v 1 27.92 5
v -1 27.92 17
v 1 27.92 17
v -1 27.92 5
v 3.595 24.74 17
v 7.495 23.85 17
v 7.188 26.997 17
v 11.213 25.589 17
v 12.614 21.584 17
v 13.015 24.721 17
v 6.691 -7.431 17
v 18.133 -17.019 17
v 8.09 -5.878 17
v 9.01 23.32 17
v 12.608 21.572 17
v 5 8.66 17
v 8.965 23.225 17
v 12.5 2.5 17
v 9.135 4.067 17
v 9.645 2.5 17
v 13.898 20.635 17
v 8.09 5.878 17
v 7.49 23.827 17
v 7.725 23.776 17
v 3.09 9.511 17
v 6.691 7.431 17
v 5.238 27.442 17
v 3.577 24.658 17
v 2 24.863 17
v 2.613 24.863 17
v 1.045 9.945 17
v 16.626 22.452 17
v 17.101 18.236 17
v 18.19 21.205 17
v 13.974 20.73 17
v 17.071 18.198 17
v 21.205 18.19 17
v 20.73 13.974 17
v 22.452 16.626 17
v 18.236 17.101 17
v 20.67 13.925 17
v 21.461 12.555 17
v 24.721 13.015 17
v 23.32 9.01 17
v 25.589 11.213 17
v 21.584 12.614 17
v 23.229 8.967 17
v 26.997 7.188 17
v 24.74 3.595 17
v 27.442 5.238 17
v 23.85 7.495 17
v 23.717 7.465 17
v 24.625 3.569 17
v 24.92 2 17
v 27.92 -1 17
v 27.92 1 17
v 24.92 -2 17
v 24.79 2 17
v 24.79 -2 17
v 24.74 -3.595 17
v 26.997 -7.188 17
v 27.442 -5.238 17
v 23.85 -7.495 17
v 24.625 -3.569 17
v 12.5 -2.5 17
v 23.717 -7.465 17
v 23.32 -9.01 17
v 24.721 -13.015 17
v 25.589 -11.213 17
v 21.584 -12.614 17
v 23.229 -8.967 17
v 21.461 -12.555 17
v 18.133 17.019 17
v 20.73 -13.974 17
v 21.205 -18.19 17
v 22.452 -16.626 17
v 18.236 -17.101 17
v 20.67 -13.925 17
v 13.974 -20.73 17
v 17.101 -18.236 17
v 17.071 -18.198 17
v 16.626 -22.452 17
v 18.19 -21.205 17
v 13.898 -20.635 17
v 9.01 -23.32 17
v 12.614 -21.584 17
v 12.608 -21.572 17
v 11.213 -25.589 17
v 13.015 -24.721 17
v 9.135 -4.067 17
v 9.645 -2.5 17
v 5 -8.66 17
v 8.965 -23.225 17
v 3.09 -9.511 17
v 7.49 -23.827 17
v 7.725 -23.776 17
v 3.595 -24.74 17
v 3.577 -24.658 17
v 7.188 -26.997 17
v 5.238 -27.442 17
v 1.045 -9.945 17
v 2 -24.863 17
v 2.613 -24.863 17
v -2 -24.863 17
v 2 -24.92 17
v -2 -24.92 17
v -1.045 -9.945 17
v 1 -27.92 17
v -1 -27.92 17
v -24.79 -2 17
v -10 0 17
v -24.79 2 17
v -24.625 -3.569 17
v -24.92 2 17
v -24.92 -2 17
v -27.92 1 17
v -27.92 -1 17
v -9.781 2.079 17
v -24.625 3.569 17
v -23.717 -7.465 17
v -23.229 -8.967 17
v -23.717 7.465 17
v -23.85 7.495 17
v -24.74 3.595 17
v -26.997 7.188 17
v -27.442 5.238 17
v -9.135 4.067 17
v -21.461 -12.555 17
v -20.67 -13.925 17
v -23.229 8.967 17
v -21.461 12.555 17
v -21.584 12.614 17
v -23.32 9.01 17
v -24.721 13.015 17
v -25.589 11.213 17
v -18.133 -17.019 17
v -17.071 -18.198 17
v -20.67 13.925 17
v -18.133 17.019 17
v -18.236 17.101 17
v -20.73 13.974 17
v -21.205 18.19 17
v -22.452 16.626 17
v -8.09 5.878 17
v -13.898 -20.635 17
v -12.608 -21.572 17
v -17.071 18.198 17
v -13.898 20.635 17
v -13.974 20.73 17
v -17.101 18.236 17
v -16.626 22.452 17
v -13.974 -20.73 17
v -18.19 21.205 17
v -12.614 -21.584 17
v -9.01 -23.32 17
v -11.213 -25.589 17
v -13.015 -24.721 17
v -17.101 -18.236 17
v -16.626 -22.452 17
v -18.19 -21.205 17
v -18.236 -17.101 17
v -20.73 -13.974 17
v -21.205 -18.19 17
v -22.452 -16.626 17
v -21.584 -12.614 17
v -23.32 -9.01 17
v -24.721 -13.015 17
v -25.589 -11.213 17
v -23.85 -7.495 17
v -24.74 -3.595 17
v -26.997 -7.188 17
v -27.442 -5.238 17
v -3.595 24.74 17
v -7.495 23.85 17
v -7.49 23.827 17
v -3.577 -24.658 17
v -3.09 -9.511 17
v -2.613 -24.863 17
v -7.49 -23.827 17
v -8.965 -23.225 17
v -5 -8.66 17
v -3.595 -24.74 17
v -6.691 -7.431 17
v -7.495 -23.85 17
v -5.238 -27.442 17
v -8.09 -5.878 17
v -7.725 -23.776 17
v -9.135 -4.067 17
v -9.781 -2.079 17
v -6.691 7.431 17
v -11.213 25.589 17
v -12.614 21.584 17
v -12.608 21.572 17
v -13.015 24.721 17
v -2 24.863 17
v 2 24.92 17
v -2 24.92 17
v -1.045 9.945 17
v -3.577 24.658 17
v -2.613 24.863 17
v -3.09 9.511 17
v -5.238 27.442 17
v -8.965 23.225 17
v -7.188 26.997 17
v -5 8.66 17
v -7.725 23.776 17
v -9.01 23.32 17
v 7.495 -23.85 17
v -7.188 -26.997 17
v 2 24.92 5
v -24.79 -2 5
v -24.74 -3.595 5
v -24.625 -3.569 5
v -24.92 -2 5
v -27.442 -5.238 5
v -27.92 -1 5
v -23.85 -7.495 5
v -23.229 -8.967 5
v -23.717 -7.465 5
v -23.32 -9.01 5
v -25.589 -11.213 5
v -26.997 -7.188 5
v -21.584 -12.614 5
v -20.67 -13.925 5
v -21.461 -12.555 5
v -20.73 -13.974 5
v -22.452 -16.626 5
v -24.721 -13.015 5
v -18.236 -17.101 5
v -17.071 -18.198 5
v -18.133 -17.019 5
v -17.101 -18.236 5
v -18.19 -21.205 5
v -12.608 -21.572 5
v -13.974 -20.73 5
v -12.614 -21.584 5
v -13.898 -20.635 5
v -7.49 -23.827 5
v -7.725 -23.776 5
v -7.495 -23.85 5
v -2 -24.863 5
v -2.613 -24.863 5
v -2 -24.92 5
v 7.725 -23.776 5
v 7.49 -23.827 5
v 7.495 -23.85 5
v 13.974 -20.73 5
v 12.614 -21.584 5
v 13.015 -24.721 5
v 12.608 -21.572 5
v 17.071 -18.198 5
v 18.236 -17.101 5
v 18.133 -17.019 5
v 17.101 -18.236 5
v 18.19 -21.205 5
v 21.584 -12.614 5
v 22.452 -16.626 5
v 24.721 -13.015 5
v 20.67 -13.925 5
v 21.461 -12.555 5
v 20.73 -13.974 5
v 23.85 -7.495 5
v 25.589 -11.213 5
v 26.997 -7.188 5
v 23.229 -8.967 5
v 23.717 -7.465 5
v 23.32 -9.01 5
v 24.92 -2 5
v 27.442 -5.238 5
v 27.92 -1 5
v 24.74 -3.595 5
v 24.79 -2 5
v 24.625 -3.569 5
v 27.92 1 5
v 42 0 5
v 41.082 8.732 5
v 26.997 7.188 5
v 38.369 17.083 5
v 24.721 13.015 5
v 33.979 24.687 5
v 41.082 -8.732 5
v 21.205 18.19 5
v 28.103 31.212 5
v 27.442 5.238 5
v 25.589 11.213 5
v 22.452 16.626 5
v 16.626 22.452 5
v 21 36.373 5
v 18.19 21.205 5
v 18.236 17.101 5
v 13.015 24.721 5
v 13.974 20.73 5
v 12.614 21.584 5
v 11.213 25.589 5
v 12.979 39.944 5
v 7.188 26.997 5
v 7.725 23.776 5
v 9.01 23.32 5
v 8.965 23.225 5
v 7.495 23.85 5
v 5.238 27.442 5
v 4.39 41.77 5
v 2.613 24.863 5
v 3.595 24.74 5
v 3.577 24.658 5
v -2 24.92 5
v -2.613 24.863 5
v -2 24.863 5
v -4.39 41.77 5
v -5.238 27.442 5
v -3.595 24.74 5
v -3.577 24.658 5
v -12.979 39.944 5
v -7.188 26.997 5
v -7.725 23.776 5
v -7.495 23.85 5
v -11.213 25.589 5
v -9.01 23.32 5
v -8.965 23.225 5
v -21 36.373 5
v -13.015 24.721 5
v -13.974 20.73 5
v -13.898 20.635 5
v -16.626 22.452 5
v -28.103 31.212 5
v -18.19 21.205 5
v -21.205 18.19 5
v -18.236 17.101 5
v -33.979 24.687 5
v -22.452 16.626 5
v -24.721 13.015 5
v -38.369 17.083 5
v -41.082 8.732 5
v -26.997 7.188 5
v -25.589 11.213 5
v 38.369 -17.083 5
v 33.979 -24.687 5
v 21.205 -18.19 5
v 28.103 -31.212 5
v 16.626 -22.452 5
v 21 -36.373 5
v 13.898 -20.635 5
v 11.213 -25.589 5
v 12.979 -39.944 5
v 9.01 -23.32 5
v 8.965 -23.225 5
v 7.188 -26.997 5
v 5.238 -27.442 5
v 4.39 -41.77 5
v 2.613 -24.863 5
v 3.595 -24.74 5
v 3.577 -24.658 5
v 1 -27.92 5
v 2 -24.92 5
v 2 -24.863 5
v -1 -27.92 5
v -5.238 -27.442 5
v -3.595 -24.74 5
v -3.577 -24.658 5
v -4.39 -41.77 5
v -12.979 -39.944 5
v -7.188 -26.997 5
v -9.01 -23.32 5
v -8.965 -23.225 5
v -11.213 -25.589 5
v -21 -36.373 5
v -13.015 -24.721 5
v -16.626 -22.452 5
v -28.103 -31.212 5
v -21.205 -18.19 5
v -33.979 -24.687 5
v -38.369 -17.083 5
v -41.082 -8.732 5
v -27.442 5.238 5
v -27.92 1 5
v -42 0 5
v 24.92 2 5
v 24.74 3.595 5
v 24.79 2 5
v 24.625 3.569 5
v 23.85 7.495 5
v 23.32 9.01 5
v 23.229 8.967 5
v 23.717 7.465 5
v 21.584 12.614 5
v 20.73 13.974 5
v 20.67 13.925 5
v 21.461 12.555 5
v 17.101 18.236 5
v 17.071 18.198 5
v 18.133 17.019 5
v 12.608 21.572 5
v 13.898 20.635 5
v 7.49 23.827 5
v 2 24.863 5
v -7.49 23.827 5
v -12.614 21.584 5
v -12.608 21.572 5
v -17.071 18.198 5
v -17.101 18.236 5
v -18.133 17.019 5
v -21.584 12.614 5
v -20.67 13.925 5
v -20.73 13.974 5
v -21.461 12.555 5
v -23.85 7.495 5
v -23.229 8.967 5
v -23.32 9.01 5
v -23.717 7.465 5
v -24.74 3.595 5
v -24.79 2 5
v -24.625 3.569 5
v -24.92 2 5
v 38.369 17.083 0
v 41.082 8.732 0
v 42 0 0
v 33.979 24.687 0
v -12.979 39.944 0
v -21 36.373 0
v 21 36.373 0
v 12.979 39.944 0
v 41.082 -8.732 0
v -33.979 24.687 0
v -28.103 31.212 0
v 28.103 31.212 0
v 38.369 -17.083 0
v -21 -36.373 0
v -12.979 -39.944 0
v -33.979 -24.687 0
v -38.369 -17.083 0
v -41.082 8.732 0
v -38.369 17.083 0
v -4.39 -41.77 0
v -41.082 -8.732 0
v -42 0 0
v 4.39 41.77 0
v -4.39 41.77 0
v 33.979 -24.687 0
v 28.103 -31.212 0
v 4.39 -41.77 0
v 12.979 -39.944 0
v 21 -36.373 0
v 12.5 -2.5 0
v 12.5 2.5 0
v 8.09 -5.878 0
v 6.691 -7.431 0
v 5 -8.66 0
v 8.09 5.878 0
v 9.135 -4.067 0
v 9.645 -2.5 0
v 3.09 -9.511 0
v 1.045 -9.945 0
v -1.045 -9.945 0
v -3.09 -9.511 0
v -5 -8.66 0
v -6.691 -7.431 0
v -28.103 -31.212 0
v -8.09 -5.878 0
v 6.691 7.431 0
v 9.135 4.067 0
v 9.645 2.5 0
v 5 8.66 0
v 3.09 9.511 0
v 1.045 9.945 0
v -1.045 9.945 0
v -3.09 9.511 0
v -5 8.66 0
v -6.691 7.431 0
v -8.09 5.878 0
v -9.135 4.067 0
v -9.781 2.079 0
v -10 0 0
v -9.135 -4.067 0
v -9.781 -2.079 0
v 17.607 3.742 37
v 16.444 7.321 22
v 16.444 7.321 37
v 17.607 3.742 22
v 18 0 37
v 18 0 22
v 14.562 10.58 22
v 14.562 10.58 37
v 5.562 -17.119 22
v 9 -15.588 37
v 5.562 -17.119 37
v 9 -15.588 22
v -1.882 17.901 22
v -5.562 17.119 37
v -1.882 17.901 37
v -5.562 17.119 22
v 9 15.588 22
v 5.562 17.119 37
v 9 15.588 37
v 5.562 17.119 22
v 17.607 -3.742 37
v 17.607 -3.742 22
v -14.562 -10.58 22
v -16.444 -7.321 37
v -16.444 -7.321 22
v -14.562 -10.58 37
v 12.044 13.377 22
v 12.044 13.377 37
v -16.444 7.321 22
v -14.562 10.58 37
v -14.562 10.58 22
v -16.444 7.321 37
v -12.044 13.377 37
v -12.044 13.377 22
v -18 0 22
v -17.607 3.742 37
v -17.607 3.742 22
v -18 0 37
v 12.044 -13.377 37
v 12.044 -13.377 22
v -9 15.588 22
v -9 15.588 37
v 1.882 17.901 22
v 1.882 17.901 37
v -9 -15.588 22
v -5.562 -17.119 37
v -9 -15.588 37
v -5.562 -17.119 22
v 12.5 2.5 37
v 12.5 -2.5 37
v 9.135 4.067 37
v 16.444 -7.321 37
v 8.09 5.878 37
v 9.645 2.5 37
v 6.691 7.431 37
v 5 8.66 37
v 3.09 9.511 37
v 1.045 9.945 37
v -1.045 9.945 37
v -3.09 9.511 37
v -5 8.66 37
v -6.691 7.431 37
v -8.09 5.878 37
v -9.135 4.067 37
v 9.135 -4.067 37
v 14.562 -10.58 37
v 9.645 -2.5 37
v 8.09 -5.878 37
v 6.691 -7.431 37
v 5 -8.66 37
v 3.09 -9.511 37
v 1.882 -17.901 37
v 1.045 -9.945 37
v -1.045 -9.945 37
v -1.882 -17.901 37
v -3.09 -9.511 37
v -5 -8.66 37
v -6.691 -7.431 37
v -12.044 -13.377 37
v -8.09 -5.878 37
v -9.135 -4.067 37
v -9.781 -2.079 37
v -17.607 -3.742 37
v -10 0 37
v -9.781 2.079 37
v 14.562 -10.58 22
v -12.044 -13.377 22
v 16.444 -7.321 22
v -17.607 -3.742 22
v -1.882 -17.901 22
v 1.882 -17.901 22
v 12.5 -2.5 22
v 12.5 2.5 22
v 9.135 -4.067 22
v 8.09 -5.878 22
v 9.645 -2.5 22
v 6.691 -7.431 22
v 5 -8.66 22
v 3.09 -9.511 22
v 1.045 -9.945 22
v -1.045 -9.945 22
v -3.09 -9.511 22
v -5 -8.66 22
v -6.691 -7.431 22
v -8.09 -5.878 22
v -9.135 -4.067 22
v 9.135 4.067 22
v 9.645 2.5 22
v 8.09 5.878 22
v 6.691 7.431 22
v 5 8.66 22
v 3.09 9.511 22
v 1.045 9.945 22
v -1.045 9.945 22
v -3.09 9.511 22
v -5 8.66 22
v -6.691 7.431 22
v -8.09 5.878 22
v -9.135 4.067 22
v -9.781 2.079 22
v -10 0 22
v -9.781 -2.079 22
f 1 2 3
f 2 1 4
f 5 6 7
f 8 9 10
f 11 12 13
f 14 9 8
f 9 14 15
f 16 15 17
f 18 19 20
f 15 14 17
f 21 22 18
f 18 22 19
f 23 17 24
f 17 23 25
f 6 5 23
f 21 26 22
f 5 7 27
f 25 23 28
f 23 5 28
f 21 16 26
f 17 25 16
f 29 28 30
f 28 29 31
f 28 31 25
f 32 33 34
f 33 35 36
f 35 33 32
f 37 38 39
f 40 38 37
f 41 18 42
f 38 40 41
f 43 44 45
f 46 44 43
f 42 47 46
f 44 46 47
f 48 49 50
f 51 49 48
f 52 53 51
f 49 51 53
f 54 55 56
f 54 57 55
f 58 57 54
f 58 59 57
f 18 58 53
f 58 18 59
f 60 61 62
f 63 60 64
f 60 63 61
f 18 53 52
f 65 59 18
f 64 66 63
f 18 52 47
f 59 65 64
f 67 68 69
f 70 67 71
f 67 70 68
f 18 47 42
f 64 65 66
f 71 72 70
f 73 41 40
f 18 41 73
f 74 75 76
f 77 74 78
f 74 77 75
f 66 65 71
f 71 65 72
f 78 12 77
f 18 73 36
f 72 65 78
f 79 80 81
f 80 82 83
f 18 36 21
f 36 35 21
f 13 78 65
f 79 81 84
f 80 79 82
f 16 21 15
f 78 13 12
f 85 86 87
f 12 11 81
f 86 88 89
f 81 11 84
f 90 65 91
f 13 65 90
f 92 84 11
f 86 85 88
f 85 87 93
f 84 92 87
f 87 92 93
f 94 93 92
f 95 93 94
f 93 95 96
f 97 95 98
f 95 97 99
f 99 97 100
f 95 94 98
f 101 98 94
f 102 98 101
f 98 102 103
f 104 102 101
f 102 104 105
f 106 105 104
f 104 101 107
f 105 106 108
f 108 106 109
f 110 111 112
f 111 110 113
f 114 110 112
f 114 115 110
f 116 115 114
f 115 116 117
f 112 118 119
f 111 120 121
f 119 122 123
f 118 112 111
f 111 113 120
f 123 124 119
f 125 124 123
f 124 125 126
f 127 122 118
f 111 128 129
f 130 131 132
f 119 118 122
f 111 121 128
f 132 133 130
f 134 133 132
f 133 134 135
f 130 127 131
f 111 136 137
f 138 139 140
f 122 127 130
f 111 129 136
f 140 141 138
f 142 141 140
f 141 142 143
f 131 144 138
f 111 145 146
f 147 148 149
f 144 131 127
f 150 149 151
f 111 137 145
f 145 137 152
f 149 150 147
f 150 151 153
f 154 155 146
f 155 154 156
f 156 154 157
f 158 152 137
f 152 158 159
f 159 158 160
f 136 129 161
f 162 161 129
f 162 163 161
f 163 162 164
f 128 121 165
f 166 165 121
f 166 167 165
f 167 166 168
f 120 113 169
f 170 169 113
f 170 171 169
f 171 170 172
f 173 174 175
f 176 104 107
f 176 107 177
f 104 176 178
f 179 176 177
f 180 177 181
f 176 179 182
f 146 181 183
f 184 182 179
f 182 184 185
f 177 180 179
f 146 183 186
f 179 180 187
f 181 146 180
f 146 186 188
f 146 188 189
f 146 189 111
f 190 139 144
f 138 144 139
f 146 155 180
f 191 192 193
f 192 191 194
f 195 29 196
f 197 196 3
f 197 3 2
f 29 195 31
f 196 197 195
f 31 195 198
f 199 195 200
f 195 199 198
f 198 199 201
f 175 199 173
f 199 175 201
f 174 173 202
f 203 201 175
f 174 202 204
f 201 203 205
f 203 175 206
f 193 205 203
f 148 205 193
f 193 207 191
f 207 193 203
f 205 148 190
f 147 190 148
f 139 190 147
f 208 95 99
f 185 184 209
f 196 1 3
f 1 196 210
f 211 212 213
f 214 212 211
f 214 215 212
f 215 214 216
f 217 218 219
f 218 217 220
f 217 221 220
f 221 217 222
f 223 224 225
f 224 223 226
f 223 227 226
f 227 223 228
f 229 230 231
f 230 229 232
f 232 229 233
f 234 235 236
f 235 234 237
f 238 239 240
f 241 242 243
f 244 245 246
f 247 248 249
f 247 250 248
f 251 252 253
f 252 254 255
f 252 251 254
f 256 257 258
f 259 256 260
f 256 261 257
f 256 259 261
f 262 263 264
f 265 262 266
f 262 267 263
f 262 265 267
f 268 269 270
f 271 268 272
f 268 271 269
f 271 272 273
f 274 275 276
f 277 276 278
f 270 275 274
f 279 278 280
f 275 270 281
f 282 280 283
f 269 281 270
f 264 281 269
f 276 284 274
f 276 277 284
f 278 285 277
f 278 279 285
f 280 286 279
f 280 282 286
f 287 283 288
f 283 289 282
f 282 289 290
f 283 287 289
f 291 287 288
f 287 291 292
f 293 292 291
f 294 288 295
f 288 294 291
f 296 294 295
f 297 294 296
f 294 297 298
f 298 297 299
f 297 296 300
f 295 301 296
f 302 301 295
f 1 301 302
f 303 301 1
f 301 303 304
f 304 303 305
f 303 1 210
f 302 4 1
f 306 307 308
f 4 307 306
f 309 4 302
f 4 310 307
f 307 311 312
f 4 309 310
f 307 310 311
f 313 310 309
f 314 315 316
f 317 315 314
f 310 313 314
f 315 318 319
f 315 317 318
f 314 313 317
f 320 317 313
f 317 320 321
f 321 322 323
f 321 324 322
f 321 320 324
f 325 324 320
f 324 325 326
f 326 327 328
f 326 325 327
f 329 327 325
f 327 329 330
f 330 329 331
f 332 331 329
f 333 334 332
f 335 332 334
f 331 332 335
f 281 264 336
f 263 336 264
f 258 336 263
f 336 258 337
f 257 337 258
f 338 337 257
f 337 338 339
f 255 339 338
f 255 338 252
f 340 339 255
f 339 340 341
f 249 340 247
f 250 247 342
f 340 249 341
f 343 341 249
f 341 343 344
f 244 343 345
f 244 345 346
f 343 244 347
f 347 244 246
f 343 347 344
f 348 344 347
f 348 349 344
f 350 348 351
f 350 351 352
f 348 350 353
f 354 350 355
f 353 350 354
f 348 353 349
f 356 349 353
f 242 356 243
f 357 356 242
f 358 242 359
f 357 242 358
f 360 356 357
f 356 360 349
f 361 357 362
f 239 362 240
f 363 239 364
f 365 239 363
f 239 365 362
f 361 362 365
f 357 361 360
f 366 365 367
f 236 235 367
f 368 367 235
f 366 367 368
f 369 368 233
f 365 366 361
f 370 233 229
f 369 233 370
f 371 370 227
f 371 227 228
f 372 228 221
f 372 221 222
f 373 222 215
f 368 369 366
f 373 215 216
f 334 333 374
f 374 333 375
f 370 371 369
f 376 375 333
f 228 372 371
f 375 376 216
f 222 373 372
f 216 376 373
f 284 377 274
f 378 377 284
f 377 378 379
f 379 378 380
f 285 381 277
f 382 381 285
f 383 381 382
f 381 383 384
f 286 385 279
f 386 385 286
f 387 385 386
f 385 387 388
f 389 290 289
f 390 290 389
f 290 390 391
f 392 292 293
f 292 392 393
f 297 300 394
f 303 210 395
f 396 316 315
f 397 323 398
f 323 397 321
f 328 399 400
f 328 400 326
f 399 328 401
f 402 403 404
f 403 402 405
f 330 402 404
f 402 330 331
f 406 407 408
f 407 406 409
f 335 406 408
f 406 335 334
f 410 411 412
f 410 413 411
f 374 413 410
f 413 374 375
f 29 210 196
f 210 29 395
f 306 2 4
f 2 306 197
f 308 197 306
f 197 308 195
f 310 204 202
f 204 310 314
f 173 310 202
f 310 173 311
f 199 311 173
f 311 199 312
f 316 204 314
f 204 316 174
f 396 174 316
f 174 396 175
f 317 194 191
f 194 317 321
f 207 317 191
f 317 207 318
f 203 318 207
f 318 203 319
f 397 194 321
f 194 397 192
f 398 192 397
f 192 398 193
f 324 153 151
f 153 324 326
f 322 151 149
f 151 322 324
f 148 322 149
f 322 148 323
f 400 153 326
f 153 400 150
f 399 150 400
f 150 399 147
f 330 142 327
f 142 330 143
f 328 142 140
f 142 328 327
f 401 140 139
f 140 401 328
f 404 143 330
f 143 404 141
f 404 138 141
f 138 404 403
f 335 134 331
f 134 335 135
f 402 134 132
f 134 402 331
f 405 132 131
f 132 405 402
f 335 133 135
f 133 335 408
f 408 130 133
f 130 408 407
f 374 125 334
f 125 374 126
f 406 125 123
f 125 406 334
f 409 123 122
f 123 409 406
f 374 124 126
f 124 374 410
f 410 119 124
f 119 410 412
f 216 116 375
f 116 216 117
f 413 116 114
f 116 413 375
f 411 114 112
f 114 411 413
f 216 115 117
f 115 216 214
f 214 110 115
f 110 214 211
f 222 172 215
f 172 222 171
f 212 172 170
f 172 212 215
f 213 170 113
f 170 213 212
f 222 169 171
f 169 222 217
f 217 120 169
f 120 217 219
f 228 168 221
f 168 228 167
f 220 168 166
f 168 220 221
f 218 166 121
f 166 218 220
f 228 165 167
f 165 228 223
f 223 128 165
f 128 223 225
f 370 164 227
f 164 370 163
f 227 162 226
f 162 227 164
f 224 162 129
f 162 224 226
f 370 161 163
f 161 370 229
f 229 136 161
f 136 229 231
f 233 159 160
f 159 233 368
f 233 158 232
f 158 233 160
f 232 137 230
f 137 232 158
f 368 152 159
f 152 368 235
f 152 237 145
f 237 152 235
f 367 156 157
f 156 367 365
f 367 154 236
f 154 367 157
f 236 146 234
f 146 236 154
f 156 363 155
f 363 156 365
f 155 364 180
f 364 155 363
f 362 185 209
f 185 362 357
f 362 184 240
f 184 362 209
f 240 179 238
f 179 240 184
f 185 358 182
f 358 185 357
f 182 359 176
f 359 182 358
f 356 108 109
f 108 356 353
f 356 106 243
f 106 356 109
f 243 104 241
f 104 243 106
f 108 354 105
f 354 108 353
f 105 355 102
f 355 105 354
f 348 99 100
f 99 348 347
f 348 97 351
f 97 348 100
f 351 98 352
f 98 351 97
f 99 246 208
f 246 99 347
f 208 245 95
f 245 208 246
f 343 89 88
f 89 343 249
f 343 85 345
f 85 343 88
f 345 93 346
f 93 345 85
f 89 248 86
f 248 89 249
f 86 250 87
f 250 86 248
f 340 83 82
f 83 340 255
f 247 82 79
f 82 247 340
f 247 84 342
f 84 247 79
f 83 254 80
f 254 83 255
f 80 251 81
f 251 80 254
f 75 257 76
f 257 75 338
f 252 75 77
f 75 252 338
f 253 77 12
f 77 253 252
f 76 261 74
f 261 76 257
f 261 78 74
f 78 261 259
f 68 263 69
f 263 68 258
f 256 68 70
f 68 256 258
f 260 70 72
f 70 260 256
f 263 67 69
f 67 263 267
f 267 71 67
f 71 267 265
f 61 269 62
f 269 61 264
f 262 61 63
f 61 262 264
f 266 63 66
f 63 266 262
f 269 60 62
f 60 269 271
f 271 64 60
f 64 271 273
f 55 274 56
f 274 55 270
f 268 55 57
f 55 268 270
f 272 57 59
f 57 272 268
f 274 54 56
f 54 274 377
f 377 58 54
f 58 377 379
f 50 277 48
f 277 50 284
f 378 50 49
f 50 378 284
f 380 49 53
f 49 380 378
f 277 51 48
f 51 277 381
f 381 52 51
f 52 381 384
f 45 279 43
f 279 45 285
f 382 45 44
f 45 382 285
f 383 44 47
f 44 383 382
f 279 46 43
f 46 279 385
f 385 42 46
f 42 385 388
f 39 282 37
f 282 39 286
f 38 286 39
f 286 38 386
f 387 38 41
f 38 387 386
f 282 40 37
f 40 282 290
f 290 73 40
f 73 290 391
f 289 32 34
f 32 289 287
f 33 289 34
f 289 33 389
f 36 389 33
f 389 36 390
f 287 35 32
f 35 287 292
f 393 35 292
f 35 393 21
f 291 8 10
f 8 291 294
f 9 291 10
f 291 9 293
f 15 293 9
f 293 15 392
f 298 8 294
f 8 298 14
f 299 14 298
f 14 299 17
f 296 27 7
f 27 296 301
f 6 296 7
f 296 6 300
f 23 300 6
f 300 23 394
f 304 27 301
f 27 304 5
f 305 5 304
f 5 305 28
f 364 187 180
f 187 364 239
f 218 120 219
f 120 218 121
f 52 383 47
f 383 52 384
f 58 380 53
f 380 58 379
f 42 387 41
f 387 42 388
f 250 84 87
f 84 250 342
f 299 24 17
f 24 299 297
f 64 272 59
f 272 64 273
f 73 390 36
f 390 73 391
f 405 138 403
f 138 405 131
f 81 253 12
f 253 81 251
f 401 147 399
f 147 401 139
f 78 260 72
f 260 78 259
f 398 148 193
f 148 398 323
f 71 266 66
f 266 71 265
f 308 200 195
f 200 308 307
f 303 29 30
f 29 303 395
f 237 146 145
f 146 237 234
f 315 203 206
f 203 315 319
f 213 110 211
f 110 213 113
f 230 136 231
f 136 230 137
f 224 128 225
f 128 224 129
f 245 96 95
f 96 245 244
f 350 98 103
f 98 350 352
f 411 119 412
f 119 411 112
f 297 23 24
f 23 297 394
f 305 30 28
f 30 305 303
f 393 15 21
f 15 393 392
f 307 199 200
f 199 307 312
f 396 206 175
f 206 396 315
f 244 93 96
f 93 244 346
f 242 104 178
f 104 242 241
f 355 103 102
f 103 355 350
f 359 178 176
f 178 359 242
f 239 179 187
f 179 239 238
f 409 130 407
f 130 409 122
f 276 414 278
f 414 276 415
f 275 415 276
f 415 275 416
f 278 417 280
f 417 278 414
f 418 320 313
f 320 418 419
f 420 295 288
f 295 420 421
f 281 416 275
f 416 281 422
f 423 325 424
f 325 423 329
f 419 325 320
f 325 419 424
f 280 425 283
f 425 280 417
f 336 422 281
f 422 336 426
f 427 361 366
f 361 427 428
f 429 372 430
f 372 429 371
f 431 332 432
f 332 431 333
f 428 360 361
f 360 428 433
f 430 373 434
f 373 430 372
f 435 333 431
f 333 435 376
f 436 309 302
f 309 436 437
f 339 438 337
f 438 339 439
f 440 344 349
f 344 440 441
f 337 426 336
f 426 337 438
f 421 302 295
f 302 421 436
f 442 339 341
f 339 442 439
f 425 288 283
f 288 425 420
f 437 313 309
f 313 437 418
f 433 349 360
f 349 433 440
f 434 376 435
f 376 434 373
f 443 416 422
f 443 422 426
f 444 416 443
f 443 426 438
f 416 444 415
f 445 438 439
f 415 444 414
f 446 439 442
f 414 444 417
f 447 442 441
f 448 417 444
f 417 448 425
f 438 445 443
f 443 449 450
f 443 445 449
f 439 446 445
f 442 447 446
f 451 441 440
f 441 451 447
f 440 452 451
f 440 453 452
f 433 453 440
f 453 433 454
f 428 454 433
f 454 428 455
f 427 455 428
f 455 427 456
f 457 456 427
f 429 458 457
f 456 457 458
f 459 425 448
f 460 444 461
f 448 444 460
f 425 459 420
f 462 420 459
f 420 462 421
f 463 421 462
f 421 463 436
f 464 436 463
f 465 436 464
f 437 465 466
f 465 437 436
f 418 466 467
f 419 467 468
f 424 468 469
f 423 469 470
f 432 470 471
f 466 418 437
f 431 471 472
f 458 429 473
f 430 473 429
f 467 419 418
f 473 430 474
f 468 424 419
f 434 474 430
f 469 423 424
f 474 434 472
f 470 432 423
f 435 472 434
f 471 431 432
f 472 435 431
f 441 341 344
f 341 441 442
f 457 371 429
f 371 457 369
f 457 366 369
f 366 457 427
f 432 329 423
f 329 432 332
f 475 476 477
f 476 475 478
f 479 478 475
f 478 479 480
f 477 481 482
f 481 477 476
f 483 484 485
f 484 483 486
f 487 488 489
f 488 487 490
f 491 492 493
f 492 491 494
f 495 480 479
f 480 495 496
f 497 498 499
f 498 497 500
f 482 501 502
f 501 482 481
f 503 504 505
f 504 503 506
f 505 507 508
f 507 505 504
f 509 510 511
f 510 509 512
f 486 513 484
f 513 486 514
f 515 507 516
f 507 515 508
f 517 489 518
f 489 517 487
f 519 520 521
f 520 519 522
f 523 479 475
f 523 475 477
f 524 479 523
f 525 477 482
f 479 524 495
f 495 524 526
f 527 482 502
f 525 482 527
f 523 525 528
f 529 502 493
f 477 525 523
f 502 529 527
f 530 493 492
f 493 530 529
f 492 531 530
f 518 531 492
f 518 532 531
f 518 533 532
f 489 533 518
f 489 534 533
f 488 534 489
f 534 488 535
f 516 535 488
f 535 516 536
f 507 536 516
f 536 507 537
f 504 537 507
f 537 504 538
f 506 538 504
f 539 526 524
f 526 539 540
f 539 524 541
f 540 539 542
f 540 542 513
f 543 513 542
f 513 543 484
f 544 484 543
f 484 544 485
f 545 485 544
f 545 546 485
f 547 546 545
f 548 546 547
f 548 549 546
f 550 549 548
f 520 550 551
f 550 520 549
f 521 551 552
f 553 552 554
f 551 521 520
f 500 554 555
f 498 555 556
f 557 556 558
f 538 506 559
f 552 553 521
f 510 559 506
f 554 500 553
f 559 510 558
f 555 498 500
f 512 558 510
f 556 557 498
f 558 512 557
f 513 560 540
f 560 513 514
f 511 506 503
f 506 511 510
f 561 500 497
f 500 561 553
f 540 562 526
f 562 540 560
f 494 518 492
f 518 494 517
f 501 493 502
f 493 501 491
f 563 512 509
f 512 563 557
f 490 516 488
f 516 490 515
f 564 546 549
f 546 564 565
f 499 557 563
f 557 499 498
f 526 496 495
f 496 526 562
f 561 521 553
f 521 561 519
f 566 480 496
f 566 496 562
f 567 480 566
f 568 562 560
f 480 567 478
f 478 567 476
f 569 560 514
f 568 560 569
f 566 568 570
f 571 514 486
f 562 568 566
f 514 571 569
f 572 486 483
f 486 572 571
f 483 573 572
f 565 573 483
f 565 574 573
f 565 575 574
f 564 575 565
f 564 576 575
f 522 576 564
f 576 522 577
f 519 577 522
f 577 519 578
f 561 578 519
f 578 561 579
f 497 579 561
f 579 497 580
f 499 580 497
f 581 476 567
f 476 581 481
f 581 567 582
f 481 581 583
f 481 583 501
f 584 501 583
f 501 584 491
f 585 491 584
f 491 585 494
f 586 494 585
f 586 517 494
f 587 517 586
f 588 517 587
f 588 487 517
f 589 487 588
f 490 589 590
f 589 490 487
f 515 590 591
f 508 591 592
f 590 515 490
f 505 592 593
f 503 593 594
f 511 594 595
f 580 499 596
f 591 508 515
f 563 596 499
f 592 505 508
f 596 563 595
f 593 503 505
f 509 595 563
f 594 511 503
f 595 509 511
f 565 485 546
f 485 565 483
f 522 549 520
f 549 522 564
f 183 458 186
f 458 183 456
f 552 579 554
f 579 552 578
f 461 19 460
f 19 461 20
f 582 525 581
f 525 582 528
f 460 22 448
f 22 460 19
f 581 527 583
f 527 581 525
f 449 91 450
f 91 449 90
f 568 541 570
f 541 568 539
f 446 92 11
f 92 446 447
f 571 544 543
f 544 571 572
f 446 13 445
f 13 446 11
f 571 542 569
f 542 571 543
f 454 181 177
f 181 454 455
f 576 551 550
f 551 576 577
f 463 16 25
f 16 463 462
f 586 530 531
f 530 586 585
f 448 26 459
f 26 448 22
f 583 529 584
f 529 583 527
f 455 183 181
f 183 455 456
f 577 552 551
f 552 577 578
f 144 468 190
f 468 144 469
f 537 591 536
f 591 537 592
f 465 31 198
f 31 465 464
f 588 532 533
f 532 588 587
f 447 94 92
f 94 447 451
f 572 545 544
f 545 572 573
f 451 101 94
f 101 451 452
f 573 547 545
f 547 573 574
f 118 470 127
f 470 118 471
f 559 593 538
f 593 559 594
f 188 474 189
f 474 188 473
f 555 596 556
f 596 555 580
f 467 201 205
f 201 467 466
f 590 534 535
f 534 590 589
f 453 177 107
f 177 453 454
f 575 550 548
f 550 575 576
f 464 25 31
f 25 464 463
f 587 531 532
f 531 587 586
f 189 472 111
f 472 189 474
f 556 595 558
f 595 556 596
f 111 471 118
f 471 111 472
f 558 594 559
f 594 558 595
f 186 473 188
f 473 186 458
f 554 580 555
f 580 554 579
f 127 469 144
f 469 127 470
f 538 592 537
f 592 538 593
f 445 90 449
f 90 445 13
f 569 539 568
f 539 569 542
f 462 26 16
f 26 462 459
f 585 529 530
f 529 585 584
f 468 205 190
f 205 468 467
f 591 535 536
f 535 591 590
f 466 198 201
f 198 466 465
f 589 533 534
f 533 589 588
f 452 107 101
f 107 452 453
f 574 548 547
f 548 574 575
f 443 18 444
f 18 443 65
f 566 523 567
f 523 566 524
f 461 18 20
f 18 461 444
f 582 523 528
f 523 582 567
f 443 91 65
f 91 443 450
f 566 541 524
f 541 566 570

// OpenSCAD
nteeth = 28;
tooth_ht = 3;
tooth_basew = 4;
tooth_topw = 2;
inner_r = 25;
flange_r = 42;
hub_r = 18;
bore_r = 10;
beltway_wd = 12;
flange_ht = 5;
hub_ht = 15;
tot_ht = beltway_wd + 2*flange_ht + hub_ht;
key_wd = 5;
module tooth (ht, base_wd, top_wd, inner_rad){
	d = sqrt(inner_rad*inner_rad - (base_wd/2)*(base_wd/2));
	polygon(points=[[-base_wd/2, 0],[-base_wd/2, d],[-top_wd/2, d+ht],[top_wd/2, d+ht],[base_wd/2, d],[base_wd/2,0]]);
}

module teeth (){
	for (i=[0:nteeth]){
		rotate([0,0,i*360.0/nteeth]){
			linear_extrude(height=beltway_wd, convexity=5){
				tooth (tooth_ht, tooth_basew, tooth_topw, inner_r);
			}
		}
	}
}

difference (){
	union (){
		cylinder(r=flange_r, h=flange_ht);
//		translate([0,0,flange_ht + beltway_wd]){
//			cylinder(r=flange_r, h=flange_ht);
//		}
		translate([0,0,2*flange_ht + beltway_wd]){
			cylinder(r=hub_r, h=hub_ht);
		}
		translate([0,0,flange_ht]){
			cylinder(r=inner_r, h=beltway_wd);
			teeth();
		}
	}
	cylinder(r=bore_r, h=100, center=true);
	translate([bore_r-key_wd/2,-key_wd/2,-0.05]){
		cube([key_wd, key_wd, 100]);
	}
}
